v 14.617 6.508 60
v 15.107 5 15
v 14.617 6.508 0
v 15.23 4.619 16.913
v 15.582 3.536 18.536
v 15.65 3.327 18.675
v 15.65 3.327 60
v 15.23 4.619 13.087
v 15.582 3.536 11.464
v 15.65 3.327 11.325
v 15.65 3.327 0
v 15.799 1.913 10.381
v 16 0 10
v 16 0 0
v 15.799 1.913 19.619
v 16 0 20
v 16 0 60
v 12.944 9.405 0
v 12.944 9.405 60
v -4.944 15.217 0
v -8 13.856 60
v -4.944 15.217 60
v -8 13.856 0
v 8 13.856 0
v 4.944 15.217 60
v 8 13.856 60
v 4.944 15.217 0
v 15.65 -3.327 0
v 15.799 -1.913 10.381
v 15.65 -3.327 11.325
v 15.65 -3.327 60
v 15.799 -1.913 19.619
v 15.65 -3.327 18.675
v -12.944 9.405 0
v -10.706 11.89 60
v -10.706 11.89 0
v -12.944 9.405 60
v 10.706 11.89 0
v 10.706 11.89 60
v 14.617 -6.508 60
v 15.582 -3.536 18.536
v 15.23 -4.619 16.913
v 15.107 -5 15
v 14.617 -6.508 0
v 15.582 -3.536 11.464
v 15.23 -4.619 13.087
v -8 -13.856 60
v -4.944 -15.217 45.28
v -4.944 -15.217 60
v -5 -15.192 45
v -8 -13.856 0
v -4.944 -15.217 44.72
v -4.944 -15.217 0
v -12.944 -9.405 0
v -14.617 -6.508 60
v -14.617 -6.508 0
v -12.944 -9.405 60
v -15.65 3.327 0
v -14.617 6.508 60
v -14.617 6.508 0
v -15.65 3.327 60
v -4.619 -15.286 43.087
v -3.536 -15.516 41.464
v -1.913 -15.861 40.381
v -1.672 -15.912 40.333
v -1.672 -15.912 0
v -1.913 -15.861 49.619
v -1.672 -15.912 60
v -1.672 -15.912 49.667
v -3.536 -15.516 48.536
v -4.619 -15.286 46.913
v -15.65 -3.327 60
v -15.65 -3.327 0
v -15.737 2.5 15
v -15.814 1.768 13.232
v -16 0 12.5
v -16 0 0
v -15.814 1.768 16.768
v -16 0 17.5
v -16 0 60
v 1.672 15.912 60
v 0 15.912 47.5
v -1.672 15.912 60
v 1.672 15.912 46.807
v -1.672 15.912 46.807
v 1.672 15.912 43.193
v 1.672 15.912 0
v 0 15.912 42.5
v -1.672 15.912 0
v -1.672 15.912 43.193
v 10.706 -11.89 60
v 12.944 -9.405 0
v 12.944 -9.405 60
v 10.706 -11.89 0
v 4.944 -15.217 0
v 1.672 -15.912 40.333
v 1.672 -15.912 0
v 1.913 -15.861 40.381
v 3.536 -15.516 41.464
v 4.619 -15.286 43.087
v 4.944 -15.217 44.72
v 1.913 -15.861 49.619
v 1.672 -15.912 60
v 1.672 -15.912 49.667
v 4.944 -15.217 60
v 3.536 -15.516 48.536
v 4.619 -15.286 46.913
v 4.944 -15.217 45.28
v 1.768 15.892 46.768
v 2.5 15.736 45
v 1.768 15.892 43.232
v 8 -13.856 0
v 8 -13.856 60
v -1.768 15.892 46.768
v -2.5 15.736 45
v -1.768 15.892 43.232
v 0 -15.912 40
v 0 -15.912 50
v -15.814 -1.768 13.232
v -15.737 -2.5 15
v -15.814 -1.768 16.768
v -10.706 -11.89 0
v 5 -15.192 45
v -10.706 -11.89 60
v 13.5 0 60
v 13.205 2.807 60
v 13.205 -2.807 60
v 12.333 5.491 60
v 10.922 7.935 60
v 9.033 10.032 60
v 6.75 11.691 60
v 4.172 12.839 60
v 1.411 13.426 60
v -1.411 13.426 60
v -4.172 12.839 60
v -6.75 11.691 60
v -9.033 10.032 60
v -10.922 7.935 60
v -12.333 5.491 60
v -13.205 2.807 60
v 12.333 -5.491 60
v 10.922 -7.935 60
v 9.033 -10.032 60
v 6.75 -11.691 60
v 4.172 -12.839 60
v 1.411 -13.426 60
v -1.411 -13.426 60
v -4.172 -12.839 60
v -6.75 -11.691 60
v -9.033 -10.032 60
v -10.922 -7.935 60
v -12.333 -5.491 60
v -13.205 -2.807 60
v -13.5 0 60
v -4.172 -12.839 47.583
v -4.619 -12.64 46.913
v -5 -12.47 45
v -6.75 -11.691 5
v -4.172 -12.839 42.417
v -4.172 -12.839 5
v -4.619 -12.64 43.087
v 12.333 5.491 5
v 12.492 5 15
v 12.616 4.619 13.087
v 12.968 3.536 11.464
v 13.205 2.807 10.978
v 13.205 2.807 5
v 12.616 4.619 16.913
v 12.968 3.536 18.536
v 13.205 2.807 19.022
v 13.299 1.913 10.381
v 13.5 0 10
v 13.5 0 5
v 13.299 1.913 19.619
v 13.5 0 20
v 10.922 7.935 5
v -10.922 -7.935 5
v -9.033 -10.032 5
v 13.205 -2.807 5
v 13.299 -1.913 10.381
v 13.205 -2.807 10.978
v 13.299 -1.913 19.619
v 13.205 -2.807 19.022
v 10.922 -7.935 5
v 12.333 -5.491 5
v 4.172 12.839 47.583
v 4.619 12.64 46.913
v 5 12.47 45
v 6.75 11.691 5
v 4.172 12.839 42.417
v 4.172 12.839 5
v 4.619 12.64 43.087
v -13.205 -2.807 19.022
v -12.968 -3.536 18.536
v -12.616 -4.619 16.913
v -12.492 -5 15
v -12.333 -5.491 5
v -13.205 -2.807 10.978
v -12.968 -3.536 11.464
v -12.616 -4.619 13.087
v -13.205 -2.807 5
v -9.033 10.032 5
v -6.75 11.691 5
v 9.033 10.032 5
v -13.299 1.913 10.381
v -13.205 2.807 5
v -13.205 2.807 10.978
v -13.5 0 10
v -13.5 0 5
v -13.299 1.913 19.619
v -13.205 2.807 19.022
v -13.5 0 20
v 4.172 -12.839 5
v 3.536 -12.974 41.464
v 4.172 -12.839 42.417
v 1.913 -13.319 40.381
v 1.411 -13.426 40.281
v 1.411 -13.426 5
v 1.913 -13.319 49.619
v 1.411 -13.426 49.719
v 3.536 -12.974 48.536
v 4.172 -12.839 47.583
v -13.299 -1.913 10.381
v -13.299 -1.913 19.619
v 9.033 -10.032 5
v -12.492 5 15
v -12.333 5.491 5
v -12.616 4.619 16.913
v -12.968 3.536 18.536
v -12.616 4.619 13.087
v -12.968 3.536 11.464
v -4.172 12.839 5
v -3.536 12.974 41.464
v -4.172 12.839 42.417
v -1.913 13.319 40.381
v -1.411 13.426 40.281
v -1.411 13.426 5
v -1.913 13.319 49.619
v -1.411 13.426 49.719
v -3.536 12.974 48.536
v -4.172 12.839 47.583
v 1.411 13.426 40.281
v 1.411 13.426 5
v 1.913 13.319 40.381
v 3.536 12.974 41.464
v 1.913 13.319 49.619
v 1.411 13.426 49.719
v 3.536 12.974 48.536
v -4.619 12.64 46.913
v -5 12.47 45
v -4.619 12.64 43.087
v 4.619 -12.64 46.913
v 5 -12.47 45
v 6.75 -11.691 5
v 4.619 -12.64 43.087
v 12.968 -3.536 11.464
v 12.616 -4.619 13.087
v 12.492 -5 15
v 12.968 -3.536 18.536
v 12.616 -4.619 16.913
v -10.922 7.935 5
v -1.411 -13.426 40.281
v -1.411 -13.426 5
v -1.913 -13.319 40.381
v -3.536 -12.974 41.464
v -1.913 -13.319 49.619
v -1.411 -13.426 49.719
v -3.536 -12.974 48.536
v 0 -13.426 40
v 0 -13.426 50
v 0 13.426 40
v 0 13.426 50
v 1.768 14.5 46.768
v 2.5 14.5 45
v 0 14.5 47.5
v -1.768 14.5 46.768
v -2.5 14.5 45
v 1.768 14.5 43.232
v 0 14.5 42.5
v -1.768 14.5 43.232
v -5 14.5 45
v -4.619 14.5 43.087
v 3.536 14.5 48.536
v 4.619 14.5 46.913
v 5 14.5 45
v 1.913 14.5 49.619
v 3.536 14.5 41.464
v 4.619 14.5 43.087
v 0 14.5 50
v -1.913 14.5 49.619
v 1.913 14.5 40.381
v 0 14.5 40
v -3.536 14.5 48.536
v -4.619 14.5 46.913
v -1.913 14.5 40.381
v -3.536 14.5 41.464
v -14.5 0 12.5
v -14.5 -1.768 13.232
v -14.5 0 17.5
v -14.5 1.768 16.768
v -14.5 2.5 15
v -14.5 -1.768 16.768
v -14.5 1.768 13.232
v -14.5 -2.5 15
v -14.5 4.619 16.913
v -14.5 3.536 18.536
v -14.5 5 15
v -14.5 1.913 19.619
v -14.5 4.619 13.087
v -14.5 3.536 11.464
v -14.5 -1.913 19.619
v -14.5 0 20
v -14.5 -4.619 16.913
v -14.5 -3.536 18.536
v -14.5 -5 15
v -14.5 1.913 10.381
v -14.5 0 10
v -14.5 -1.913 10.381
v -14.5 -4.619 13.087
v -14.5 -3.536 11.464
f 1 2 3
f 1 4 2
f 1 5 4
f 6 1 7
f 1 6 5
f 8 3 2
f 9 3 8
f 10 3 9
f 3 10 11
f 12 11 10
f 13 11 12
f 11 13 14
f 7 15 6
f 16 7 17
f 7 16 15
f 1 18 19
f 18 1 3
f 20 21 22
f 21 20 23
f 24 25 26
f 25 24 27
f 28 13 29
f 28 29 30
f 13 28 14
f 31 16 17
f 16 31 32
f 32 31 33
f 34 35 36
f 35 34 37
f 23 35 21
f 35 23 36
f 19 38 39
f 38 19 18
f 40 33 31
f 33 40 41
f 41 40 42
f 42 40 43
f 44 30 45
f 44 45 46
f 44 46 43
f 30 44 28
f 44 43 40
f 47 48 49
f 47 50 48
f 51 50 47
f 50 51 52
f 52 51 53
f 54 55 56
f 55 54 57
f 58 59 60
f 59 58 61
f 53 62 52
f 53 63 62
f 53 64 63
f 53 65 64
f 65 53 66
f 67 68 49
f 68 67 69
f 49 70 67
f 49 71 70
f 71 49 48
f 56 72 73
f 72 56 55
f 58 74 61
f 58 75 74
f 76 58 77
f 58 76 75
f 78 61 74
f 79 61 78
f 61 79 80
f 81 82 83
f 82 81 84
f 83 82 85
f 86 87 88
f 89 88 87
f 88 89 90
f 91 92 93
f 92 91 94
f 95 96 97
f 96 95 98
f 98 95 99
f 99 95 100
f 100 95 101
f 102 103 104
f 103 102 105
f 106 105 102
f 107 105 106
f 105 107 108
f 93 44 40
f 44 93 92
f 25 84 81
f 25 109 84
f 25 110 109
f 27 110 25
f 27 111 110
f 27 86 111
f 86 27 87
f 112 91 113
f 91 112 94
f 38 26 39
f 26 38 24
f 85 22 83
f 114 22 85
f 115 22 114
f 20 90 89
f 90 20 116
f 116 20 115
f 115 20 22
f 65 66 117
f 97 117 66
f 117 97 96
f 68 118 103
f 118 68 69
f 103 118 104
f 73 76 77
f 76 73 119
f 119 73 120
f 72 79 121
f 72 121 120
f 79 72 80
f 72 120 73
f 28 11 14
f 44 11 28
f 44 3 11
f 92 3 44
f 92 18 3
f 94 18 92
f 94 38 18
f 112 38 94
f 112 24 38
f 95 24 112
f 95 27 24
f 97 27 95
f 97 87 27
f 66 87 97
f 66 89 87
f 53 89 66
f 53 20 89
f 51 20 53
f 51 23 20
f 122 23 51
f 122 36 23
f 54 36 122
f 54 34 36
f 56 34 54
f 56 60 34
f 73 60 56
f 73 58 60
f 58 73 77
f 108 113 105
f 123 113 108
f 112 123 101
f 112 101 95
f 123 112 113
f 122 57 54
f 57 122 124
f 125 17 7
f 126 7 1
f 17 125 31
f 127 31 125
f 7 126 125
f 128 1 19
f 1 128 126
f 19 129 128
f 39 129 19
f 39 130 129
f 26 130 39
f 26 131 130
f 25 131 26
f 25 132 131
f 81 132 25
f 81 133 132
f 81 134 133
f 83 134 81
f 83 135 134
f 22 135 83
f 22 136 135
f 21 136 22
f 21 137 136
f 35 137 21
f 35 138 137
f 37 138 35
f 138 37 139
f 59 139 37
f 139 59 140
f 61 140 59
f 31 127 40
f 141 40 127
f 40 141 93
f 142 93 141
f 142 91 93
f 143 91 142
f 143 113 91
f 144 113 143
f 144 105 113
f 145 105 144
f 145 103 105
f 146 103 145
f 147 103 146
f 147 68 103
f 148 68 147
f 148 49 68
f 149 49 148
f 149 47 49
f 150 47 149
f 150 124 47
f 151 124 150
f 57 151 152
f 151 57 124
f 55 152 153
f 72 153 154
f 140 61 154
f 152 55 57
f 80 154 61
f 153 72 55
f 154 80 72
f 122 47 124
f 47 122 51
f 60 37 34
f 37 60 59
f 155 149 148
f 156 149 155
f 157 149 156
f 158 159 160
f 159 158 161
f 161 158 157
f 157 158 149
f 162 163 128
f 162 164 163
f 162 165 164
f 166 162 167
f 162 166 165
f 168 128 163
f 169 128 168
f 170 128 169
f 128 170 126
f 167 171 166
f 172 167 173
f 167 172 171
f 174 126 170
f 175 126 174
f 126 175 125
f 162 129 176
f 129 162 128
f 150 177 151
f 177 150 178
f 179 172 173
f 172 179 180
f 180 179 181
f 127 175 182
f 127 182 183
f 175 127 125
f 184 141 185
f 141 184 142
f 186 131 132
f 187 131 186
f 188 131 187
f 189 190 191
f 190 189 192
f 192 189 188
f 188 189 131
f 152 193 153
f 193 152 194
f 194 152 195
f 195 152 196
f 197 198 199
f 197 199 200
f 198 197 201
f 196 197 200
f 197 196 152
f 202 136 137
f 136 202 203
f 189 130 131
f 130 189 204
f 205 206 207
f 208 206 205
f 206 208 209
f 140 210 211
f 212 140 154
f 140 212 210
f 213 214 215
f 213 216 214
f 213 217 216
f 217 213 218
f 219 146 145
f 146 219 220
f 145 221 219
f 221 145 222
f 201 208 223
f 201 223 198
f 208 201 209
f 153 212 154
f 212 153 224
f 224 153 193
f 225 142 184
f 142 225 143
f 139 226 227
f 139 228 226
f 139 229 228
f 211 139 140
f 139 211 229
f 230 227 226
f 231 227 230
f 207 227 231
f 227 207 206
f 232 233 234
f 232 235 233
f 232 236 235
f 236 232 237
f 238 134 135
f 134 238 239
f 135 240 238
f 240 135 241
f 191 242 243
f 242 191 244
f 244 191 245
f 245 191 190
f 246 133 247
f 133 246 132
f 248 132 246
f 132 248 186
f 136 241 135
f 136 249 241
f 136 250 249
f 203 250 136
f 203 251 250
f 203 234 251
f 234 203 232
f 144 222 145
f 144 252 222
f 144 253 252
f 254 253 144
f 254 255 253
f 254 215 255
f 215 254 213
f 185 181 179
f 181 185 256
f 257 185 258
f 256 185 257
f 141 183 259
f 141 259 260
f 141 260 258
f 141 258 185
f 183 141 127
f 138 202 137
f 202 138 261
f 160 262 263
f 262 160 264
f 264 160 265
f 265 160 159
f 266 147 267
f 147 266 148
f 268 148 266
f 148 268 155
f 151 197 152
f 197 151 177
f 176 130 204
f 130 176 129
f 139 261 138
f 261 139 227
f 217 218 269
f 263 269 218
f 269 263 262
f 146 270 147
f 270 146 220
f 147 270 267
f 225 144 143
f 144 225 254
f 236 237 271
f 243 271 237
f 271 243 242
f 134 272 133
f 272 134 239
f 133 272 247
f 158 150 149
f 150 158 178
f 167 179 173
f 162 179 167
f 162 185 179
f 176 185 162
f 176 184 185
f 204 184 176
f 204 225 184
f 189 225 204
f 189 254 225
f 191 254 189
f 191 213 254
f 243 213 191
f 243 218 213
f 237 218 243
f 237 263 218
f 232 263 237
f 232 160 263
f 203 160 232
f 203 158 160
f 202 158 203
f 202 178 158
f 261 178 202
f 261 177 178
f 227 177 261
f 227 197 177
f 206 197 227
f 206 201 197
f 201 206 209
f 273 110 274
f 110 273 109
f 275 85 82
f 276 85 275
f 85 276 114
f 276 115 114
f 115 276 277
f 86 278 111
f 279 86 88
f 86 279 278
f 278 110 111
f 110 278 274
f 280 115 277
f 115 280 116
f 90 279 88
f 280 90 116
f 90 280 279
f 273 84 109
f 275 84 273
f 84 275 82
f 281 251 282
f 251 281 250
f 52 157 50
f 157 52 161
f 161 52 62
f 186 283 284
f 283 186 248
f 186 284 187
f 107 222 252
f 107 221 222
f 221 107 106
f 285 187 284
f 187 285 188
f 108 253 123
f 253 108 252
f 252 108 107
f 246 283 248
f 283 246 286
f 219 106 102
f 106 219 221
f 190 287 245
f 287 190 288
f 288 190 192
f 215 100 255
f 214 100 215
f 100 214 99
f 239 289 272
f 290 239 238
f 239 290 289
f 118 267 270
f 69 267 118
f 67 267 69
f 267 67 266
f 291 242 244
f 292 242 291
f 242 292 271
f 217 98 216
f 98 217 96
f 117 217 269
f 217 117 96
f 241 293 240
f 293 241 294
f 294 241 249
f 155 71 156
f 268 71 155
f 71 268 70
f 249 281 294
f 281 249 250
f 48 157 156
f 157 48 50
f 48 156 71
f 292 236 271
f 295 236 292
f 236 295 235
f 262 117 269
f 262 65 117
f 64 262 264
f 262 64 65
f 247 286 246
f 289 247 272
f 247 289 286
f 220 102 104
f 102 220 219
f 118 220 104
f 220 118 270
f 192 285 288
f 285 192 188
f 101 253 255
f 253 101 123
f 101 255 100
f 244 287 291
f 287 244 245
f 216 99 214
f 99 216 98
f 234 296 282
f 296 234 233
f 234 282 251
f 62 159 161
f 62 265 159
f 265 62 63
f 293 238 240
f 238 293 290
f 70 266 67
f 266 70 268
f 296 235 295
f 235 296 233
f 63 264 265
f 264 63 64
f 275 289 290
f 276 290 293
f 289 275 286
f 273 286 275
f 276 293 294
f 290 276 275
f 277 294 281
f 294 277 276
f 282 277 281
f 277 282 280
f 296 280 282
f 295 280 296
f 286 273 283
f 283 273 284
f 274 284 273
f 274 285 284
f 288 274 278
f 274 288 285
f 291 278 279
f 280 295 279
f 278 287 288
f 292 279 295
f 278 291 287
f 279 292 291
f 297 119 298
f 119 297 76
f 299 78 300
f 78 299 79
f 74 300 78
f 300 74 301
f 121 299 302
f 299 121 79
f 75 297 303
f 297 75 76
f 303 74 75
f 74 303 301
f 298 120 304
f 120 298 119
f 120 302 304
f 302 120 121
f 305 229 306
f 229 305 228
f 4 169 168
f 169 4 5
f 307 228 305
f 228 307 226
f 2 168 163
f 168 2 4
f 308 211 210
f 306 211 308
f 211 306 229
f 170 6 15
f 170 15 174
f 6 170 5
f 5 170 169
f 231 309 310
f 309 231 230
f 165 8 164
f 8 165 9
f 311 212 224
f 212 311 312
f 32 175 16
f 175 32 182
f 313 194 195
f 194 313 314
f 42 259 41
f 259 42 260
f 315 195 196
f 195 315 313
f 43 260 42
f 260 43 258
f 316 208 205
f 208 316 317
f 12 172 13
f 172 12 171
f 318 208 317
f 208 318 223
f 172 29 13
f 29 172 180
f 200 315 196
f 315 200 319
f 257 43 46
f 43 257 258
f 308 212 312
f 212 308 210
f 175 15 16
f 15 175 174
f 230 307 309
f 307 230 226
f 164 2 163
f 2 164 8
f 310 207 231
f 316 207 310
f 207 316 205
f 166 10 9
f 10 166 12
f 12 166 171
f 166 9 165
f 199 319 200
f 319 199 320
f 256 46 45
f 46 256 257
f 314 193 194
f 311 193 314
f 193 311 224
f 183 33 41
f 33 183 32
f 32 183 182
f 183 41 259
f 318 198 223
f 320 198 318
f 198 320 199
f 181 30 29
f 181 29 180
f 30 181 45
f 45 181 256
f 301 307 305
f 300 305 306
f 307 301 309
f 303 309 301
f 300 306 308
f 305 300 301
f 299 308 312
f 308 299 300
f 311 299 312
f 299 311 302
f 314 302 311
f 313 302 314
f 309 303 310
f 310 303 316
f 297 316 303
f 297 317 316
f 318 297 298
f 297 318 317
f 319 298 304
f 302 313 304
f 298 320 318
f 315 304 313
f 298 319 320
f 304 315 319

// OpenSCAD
diameter = 27;
height = 60;

difference ()
{
    cylinder(height,d=diameter+5);
    translate([0,0,5]) cylinder(height,d=diameter);    

    translate([0,diameter, height*3/4]) rotate([90,0,0]) cylinder(2*diameter,d=5);
    translate([0,diameter/2+1,height*3/4]) rotate([90,0,0]) cylinder(2*diameter,d=10);
    translate([-diameter,0,height*1/4]) rotate([90,0,90]) cylinder(2*diameter,d=5);
    translate([-diameter/2-1,0,height*1/4]) rotate([90,0,90]) cylinder(2*diameter,d=10);
    
}
